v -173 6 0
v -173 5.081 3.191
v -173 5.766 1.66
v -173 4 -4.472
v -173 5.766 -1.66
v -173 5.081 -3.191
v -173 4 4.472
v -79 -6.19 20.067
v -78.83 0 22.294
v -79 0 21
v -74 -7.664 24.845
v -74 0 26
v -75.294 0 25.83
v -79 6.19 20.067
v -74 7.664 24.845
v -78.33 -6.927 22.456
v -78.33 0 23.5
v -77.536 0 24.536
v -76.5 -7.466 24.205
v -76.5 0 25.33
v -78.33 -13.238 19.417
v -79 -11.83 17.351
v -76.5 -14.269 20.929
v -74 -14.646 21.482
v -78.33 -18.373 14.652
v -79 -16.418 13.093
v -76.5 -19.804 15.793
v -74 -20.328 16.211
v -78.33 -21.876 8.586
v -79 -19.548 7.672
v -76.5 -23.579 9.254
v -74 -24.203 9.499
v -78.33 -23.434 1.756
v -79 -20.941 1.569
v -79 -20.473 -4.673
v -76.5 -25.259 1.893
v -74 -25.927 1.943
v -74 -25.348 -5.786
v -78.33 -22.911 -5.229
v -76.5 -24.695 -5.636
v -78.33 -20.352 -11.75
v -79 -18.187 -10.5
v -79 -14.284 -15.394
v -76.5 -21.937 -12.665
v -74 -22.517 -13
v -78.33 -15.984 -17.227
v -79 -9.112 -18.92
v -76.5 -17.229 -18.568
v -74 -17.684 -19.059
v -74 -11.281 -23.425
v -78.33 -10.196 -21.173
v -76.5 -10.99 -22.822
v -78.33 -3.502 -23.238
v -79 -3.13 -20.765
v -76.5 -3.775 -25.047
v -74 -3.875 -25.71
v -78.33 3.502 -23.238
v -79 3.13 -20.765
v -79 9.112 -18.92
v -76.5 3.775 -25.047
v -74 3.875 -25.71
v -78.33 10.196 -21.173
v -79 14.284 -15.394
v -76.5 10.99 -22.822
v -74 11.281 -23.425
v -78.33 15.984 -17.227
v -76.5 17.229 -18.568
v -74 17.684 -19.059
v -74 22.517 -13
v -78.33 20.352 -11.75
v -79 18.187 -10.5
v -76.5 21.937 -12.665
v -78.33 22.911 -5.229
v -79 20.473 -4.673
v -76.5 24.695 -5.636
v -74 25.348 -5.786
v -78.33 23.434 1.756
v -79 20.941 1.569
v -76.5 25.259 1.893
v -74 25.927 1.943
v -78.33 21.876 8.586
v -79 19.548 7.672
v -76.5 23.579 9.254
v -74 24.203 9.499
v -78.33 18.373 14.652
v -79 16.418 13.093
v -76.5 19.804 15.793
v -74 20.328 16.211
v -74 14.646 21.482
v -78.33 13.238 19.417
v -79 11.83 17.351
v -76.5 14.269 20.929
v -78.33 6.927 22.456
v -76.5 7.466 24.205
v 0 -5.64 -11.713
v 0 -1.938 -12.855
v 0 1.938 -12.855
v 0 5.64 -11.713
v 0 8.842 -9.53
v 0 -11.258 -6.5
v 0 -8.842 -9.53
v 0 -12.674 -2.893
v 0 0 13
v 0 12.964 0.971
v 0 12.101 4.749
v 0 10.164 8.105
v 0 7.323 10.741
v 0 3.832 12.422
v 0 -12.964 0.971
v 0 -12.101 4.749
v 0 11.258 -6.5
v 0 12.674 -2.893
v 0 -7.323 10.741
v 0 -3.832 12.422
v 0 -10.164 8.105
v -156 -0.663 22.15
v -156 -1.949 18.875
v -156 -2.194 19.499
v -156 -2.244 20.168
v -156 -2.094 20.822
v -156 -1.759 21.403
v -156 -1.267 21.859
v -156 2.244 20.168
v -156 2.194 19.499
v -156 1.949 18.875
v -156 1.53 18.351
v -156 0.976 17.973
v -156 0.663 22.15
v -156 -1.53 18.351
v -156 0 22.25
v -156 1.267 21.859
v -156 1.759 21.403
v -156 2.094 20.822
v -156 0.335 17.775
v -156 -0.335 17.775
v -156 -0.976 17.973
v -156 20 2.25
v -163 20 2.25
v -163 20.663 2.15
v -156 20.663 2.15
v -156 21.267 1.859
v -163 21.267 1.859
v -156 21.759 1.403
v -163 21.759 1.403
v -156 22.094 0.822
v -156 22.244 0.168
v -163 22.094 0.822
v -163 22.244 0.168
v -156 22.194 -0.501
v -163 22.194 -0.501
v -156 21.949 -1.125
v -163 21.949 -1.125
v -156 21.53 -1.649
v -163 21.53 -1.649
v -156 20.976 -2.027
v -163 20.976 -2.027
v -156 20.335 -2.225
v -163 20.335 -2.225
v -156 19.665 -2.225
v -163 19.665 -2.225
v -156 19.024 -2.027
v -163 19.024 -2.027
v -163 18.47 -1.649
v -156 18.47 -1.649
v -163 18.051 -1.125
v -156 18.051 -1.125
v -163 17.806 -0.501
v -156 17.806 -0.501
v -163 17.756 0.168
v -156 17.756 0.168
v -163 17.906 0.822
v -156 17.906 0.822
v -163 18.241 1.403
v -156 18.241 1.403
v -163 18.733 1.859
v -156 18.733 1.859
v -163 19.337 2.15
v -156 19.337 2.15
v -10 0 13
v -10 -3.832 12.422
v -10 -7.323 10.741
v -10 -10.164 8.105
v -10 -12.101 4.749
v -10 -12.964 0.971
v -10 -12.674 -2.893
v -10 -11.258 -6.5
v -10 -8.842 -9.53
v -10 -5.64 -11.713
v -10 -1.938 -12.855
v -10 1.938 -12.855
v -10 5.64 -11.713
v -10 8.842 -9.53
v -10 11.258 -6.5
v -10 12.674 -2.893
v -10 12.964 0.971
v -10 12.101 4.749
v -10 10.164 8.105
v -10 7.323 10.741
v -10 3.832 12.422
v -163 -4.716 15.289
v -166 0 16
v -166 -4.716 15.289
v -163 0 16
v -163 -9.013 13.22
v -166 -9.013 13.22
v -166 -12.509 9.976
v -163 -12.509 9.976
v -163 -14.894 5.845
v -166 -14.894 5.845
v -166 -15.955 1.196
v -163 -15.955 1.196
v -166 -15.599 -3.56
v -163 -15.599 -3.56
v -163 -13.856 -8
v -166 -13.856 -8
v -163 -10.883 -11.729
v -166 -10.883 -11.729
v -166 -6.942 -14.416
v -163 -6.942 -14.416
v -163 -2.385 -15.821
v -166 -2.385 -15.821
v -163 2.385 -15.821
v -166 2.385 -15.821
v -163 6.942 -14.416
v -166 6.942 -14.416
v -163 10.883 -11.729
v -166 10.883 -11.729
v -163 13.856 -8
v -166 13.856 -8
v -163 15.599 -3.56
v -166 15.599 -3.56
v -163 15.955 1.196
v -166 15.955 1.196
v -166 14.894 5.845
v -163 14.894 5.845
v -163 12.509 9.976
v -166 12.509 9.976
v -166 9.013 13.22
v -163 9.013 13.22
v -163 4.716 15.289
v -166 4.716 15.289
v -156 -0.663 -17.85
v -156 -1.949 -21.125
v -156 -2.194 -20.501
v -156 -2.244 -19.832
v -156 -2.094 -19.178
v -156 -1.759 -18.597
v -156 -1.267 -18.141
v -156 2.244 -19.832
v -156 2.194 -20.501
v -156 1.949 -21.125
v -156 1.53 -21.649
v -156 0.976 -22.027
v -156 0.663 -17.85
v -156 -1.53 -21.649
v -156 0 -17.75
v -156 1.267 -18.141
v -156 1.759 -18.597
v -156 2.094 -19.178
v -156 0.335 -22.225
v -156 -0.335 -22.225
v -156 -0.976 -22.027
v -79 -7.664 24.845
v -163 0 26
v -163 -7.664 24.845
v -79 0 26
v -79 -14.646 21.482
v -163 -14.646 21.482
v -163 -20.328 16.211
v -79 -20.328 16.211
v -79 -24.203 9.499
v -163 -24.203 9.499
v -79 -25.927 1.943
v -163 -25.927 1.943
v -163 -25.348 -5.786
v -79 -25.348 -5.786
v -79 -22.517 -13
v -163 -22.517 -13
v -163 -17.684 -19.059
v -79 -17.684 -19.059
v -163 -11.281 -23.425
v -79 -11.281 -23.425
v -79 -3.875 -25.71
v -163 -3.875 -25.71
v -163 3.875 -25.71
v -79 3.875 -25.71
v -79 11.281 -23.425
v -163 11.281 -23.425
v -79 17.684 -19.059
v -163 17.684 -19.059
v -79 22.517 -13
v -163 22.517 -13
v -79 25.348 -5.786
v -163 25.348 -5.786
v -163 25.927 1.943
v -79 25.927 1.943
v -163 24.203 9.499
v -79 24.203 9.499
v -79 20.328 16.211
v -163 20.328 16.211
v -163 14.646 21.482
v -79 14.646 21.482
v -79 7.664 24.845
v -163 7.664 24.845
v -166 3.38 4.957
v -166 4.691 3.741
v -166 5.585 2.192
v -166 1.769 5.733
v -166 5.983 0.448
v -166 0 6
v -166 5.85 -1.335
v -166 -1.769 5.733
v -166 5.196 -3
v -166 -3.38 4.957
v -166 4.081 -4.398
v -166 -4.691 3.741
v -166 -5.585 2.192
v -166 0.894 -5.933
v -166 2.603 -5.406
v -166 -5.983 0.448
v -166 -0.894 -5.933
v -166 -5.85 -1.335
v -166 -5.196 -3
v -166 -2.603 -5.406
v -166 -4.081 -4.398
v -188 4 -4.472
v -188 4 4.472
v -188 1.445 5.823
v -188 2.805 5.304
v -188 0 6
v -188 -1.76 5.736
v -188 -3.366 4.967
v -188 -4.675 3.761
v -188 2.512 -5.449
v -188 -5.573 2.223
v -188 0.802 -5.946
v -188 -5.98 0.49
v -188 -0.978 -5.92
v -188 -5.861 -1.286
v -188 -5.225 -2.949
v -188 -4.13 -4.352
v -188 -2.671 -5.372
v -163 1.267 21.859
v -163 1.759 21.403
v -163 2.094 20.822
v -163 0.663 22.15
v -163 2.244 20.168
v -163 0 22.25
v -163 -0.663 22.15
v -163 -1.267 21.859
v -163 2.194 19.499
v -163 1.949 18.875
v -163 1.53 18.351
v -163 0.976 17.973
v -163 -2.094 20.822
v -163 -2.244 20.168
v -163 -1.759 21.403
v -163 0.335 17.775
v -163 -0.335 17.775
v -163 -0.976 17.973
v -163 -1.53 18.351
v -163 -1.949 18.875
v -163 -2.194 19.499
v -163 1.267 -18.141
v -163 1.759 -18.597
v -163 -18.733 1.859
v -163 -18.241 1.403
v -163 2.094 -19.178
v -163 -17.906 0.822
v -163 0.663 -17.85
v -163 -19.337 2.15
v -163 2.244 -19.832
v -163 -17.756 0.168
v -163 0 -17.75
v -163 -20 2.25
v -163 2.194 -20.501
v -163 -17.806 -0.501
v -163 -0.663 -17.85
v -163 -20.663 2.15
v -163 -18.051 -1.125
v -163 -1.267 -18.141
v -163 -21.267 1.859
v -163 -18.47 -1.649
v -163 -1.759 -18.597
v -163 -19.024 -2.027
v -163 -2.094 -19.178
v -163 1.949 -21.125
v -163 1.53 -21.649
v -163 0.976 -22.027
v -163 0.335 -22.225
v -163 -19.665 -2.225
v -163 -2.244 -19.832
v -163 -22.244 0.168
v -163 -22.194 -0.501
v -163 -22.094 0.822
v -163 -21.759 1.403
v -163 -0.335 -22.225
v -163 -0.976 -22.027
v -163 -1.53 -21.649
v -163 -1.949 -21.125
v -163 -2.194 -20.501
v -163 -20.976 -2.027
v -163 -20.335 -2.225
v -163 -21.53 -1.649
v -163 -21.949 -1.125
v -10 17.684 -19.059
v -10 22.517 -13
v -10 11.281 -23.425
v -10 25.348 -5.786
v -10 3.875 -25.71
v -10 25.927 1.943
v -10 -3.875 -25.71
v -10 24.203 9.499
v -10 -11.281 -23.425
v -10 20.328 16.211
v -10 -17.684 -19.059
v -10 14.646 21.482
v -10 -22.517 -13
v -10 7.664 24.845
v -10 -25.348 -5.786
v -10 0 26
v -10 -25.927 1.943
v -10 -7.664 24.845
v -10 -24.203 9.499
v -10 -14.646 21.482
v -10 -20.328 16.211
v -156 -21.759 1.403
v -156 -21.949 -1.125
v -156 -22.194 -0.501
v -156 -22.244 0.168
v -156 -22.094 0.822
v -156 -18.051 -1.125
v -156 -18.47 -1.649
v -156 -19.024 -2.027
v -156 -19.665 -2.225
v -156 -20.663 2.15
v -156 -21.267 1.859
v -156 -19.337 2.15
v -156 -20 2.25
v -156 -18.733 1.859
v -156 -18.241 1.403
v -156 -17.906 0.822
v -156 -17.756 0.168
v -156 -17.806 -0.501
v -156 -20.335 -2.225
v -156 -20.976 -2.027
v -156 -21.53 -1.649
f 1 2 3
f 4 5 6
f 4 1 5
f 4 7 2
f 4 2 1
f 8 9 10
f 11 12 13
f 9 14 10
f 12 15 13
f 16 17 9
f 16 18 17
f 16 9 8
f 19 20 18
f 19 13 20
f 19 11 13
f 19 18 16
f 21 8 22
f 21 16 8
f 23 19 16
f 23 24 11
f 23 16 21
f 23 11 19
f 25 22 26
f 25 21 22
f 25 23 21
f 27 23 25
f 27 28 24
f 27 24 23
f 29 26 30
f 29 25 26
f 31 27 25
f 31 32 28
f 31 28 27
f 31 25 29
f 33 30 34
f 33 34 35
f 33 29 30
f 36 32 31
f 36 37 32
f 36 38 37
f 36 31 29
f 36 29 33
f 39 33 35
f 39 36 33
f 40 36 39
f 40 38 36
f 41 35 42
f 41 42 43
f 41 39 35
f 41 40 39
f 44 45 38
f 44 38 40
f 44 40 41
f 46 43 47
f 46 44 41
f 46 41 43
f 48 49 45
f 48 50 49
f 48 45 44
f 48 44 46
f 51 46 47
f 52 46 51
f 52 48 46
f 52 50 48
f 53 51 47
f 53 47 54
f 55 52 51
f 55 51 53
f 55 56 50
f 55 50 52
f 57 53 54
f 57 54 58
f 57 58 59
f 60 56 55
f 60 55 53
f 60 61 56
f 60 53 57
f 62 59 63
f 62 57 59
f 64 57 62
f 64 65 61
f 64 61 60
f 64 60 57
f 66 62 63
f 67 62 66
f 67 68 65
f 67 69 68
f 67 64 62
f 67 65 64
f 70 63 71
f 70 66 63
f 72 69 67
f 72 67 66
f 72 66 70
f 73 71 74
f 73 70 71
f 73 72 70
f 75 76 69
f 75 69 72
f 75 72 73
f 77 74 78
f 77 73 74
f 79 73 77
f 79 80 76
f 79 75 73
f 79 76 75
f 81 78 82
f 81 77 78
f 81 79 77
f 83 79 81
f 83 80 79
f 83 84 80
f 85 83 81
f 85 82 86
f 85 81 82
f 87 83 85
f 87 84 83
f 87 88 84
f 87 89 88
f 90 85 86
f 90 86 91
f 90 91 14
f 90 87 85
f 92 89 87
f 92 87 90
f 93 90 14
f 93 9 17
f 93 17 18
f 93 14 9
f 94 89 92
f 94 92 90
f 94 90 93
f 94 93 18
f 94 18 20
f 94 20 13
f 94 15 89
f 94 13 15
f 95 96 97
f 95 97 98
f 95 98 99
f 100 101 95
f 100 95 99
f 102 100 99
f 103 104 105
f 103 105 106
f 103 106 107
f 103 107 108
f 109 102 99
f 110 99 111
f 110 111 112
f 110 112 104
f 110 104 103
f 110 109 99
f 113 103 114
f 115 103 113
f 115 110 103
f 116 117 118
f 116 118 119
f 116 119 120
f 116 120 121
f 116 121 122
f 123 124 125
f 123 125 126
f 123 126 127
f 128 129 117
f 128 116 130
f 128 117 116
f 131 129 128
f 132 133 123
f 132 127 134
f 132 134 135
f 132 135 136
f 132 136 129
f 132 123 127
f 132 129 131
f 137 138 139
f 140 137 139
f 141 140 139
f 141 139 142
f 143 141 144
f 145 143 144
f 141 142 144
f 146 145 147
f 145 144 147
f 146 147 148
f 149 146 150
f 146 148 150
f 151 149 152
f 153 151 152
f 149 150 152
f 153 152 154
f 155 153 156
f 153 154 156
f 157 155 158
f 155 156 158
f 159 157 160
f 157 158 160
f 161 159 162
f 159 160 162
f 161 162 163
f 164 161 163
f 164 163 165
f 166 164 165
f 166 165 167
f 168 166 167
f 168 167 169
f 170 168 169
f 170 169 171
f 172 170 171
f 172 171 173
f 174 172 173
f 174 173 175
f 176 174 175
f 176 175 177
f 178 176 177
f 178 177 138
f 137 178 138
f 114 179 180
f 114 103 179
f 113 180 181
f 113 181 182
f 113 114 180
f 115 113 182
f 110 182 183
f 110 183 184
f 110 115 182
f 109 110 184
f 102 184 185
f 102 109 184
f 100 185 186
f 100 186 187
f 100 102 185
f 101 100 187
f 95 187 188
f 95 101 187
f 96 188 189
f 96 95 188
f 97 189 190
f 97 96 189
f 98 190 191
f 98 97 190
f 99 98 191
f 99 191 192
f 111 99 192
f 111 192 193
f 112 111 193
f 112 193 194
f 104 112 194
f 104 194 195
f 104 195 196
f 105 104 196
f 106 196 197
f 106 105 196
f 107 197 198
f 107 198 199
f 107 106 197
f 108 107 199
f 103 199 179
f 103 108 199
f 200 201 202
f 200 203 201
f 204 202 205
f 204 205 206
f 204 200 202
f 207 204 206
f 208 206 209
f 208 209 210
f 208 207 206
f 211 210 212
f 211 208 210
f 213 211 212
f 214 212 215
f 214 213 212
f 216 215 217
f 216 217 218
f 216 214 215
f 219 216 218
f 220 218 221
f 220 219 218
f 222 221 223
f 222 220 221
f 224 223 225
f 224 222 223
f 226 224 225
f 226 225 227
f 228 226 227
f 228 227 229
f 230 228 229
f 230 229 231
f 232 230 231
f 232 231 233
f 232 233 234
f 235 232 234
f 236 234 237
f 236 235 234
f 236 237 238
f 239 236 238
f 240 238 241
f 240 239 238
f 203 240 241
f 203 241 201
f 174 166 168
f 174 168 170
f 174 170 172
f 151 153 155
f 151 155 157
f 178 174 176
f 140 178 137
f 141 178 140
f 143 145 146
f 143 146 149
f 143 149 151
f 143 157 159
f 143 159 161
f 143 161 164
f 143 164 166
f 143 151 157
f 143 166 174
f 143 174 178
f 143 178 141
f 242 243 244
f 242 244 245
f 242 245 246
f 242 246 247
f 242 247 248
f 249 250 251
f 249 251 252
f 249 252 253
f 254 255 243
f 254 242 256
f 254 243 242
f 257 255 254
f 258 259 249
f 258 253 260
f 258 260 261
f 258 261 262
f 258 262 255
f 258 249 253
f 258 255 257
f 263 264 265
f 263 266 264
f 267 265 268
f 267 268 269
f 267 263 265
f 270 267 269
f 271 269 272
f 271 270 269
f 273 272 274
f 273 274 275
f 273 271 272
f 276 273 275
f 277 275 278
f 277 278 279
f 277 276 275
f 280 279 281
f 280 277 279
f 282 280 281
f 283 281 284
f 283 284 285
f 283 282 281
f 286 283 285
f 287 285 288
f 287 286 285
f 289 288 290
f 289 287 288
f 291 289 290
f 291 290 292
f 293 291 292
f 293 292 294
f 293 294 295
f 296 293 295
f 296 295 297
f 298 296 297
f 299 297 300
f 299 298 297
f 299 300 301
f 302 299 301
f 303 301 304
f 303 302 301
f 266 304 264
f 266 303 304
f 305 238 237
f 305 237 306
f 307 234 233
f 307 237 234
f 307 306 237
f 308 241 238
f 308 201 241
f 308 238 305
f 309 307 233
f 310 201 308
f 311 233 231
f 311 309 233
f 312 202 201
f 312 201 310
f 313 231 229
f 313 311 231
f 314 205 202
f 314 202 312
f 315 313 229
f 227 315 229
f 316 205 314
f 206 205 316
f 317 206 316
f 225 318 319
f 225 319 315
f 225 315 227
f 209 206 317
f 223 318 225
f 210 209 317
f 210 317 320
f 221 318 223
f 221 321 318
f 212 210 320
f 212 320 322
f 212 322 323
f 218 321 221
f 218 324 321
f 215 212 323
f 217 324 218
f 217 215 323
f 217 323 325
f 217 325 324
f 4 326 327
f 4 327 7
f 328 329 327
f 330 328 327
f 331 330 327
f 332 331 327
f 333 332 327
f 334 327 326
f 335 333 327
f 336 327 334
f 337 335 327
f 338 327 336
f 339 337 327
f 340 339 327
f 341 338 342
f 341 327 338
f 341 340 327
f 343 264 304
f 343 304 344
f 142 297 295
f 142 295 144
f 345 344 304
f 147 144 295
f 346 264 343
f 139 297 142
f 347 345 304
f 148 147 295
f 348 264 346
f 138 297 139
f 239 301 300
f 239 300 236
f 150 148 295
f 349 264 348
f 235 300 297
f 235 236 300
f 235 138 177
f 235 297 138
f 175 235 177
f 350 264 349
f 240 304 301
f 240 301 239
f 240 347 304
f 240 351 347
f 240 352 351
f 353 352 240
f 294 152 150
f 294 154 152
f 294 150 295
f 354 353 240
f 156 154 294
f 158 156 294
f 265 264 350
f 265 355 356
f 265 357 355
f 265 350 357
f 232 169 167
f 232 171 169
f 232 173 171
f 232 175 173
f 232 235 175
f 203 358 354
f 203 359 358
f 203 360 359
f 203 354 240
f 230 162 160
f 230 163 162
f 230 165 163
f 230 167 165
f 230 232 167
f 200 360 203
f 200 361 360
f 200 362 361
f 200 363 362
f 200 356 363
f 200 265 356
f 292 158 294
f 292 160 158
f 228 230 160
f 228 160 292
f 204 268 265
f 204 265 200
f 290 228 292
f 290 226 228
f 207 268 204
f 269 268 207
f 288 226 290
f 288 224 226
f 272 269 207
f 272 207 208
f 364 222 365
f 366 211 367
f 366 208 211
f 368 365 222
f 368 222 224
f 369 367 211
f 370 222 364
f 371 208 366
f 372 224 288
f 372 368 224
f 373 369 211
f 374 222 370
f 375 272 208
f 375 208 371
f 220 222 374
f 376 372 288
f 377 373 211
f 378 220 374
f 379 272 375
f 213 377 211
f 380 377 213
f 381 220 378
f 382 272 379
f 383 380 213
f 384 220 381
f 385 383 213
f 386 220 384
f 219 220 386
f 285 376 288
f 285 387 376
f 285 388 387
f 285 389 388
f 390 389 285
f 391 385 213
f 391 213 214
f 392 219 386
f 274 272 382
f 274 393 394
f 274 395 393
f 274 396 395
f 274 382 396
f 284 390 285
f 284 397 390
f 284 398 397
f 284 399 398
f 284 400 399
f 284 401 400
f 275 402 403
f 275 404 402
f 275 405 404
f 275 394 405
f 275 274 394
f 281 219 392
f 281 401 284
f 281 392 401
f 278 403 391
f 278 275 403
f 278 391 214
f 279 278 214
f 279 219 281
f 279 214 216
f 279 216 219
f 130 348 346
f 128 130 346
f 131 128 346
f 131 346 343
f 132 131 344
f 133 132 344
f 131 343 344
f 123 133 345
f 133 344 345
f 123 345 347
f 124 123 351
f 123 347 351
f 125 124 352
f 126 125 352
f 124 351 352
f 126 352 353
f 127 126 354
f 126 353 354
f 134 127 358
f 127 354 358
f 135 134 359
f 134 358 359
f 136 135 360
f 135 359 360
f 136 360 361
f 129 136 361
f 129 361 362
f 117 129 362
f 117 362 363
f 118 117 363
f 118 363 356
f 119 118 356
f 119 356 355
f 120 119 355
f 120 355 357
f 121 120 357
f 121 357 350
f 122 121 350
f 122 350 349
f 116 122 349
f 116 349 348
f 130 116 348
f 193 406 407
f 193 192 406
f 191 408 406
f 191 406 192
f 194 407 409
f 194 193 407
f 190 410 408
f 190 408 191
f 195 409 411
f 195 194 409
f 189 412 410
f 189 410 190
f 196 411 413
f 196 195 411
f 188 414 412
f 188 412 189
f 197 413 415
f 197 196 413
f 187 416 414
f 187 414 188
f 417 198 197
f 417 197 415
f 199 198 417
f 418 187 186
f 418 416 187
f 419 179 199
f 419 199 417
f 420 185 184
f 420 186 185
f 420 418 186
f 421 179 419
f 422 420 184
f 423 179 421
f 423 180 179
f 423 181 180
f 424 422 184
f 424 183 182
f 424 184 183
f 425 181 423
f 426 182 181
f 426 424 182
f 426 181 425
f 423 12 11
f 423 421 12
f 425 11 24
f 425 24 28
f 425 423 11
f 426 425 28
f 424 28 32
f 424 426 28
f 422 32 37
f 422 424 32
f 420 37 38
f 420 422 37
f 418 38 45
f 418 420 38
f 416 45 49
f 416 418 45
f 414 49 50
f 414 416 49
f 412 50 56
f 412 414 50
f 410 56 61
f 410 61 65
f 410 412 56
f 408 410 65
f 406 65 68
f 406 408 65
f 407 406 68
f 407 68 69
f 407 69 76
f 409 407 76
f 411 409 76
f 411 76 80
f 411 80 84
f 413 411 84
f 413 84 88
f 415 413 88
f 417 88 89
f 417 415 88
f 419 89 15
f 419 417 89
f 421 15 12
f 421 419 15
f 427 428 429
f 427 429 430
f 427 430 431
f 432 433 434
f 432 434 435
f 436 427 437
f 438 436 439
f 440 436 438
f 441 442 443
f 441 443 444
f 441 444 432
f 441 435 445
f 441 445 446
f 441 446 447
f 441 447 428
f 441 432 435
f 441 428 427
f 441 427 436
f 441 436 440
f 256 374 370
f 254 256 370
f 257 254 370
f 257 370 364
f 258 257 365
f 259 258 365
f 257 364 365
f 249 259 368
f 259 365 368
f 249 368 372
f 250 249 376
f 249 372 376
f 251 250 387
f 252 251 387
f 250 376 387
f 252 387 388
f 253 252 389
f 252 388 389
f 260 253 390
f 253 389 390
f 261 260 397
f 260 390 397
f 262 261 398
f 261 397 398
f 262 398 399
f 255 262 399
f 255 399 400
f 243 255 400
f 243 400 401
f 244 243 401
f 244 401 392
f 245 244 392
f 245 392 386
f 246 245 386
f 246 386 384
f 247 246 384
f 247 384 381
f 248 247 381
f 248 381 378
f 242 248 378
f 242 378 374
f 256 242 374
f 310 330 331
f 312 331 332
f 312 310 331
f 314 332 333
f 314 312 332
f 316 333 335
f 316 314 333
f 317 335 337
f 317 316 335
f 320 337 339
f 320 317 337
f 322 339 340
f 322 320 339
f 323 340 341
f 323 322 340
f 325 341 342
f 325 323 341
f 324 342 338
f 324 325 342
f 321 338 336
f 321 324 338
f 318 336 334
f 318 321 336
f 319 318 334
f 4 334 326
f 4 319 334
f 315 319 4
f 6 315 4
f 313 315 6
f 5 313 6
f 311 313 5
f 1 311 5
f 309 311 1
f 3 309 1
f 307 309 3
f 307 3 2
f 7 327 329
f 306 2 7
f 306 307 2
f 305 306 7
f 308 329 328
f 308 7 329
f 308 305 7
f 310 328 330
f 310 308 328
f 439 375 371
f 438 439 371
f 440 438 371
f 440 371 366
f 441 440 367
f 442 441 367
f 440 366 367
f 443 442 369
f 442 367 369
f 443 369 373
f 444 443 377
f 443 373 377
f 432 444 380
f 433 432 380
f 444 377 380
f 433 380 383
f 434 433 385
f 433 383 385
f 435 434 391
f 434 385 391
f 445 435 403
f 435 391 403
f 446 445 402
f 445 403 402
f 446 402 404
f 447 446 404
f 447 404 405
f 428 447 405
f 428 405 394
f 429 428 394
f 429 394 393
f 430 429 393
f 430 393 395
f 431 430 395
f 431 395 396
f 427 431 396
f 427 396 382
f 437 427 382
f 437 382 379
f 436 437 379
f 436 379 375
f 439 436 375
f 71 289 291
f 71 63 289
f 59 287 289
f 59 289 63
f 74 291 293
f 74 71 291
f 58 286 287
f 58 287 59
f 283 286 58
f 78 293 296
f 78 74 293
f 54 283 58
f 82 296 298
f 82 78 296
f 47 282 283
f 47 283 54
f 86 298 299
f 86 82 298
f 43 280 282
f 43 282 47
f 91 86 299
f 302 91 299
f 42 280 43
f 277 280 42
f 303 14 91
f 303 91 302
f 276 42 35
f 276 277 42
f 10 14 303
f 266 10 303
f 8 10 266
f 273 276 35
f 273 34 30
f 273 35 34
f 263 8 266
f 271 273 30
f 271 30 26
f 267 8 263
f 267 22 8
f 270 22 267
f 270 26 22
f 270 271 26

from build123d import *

# Parameters (mm, degrees)
CUT_EXTRUDE_1_DEPTH      = 192.562000407
CUT_EXTRUDE_1_DEPTH_BACK = 192.562000407
SKETCH_2_W               = 15
SKETCH_2_H               = 2
SKETCH_3_R               = 2.25
CUT_EXTRUDE_2_DEPTH      = 10


with BuildPart() as part:
    # 草圖1 → 旋轉1 (revolve)
    with BuildSketch(Plane.XY, mode=Mode.PRIVATE) as revolve_1_sk:
        with BuildLine():
            Line((-188, 0), (-188, 6))
            Line((-188, 6), (-166, 6))
            Line((-166, 6), (-166, 16))
            Line((-166, 16), (-163, 16))
            Line((-163, 16), (-163, 26))
            Line((-163, 26), (-79, 26))
            Line((-79, 26), (-79, 21))
            ThreePointArc((-79, 21), (-77.535533906, 24.535533906), (-74, 26))
            Line((-74, 26), (-10, 26))
            Line((-10, 26), (-10, 13))
            Line((-10, 13), (0, 13))
            Line((0, 13), (0, 0))
            Line((0, 0), (-188, 0))
        make_face()
    revolve(revolve_1_sk.sketch.rotate(Axis((-188, 0, 0), (1, 0, 0)), 90), axis=Axis((-188, 0, 0), (1, 0, 0)))

    # 草圖2 → 伸長1 (cut, two sides: drawn at the far end of the back side and taken through both)
    with BuildSketch(Plane.XY.offset(-CUT_EXTRUDE_1_DEPTH_BACK)):
        with Locations((-180.5, 5)):
            Rectangle(SKETCH_2_W, SKETCH_2_H)
    extrude(amount=CUT_EXTRUDE_1_DEPTH + CUT_EXTRUDE_1_DEPTH_BACK, mode=Mode.SUBTRACT)

    # 草圖3 → 伸長2 (cut)
    with BuildSketch(Plane.ZY.offset(166)):
        with Locations((0, 20)):
            Circle(SKETCH_3_R)
        with Locations((20, 0)):
            Circle(SKETCH_3_R)
        with Locations((0, -20)):
            Circle(SKETCH_3_R)
        with Locations((-20, 0)):
            Circle(SKETCH_3_R)
    extrude(amount=-CUT_EXTRUDE_2_DEPTH, mode=Mode.SUBTRACT)


solid = part.part
